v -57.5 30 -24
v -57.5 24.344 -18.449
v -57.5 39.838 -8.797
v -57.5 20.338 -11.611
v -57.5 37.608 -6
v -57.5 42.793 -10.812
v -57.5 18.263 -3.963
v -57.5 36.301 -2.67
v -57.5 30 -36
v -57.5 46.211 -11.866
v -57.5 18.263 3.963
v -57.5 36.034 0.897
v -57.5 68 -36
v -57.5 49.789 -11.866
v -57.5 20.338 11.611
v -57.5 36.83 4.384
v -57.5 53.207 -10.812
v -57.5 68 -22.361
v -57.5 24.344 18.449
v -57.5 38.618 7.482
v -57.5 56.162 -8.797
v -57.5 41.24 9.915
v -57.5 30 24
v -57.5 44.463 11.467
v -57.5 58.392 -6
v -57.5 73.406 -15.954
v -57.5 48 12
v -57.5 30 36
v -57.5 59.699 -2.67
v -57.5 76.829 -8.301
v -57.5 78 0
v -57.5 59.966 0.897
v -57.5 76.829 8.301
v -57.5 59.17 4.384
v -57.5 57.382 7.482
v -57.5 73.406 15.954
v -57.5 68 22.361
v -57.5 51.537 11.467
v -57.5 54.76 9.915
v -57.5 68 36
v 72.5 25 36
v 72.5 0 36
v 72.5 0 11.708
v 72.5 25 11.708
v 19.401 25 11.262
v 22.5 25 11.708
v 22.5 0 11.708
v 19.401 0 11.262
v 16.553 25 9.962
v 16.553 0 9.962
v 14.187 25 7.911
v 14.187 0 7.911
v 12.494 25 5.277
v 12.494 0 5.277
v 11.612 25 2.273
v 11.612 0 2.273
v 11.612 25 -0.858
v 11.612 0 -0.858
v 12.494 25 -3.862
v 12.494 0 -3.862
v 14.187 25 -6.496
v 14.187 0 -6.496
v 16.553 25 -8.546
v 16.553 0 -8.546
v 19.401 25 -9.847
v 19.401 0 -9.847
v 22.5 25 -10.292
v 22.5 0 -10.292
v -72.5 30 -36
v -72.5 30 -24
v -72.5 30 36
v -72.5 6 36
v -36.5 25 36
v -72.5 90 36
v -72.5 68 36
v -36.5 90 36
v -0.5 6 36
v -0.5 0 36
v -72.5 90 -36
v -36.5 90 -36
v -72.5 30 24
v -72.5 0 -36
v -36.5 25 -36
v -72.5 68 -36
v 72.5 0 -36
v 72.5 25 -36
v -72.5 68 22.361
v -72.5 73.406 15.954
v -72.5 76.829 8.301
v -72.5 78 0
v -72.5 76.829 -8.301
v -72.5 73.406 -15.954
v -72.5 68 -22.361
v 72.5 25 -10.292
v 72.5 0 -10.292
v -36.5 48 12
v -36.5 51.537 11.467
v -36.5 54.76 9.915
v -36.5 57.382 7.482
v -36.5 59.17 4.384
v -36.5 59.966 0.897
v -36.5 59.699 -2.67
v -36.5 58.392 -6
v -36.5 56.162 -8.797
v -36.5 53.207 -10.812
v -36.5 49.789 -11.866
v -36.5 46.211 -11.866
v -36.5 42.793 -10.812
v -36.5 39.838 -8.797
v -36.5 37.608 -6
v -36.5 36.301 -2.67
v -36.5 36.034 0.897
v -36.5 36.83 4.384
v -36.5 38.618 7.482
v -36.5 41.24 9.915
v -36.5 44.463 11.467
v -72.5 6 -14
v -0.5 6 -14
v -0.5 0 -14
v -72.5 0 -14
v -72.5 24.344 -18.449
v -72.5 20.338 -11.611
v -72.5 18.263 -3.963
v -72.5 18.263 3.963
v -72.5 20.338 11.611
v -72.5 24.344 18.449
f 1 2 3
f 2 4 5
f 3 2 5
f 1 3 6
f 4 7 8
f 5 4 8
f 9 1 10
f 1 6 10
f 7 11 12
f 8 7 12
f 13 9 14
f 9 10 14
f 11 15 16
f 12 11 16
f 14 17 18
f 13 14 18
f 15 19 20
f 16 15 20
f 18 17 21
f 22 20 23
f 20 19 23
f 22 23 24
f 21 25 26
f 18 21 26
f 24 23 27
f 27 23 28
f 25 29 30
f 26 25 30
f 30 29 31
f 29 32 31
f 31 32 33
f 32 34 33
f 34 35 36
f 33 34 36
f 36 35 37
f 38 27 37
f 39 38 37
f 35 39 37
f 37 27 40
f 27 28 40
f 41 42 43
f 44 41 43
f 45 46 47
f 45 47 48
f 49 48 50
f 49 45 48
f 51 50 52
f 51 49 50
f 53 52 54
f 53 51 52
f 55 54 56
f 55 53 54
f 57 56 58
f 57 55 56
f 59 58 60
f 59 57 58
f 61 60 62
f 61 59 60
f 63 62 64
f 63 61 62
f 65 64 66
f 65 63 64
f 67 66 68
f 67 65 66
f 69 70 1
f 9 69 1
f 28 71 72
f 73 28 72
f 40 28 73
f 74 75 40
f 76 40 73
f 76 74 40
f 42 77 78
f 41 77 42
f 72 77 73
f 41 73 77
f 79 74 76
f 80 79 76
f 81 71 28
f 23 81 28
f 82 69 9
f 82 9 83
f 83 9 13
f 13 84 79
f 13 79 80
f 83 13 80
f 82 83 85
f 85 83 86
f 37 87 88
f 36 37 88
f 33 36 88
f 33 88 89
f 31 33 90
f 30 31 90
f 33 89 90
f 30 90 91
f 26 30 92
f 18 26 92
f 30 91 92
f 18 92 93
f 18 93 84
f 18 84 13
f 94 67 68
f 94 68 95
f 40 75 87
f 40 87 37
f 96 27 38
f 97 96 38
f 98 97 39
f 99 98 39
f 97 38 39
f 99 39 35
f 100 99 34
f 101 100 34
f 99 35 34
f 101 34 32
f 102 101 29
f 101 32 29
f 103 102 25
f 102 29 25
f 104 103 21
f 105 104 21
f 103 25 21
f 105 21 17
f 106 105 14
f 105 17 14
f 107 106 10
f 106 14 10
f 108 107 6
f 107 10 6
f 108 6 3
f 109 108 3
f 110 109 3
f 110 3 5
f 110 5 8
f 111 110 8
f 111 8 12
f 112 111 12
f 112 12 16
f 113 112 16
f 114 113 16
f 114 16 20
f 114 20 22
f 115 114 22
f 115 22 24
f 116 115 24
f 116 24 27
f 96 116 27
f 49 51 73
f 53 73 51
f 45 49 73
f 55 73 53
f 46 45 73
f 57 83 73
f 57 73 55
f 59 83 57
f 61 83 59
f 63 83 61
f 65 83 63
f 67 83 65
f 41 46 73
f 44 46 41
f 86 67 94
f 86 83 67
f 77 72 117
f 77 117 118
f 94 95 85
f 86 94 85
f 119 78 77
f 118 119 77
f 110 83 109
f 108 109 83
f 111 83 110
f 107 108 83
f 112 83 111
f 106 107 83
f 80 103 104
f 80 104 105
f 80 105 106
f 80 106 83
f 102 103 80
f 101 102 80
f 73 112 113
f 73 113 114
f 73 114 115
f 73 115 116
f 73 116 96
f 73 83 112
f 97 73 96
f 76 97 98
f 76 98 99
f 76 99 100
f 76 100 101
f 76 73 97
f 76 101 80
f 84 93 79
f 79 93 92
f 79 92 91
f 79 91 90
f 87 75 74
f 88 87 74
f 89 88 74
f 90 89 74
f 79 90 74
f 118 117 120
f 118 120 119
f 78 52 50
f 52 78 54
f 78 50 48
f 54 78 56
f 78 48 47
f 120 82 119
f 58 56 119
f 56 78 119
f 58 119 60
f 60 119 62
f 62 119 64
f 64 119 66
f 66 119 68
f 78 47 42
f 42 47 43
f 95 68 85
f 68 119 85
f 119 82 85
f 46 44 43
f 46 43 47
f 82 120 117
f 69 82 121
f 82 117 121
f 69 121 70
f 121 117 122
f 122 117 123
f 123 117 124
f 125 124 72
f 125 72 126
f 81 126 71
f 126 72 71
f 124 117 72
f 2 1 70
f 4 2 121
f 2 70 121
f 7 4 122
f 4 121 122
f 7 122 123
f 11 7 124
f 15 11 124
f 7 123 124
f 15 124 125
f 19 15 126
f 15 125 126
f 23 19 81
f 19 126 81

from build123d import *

# Parameters (mm, degrees)
SKETCH1_W           = 145
SKETCH1_H           = 72
BOSS_EXTRUDE1_DEPTH = 25
SKETCH2_W           = 72
SKETCH2_H           = 6
CUT_EXTRUDE1_DEPTH  = 50
CUT_EXTRUDE2_DEPTH  = 50
SKETCH4_W           = 36
SKETCH4_H           = 65
BOSS_EXTRUDE2_DEPTH = 72
SKETCH5_R           = 30
CUT_EXTRUDE3_DEPTH  = 15
SKETCH6_W           = 15
SKETCH6_H           = 38
CUT_EXTRUDE4_DEPTH  = 137.162586638
SKETCH7_R           = 12
CUT_EXTRUDE5_DEPTH  = 163.160414405


with BuildPart() as part:
    # Sketch1 → Boss-Extrude1 (new body)
    with BuildSketch(Plane(origin=(0, 0, 0), x_dir=(1, 0, 0), z_dir=(0, 1, 0))):
        Rectangle(SKETCH1_W, SKETCH1_H)
    extrude(amount=BOSS_EXTRUDE1_DEPTH)

    # Sketch2 → Cut-Extrude1 (cut)
    with BuildSketch(Plane.XY.offset(36)):
        with Locations((-36.5, 3)):
            Rectangle(SKETCH2_W, SKETCH2_H)
    extrude(amount=-CUT_EXTRUDE1_DEPTH, mode=Mode.SUBTRACT)

    # Sketch3 → Cut-Extrude2 (cut)
    with BuildSketch(Plane(origin=(0, 25, 0), x_dir=(1, 0, 0), z_dir=(0, 1, 0))):
        with BuildLine():
            Line((22.5, 10.292135336), (72.5, 10.292135336))
            Line((72.5, 10.292135336), (72.5, -11.707864664))
            Line((72.5, -11.707864664), (22.5, -11.707864664))
            ThreePointArc((22.5, -11.707864664), (11.5, -0.707864664), (22.5, 10.292135336))
        make_face()
    extrude(amount=-CUT_EXTRUDE2_DEPTH, mode=Mode.SUBTRACT)

    # Sketch4 → Boss-Extrude2 (add)
    with BuildSketch(Plane.XY.offset(36)):
        with Locations((-54.5, 57.5)):
            Rectangle(SKETCH4_W, SKETCH4_H)
    extrude(amount=-BOSS_EXTRUDE2_DEPTH)

    # Sketch5 → Cut-Extrude3 (cut)
    with BuildSketch(Plane.ZY.offset(72.5)):
        with Locations((0, 48)):
            Circle(SKETCH5_R)
    extrude(amount=-CUT_EXTRUDE3_DEPTH, mode=Mode.SUBTRACT)

    # Sketch6 → Cut-Extrude4 (cut, through all)
    with BuildSketch(Plane.XY.offset(36)):
        with Locations((-65, 49)):
            Rectangle(SKETCH6_W, SKETCH6_H)
    extrude(amount=-CUT_EXTRUDE4_DEPTH, mode=Mode.SUBTRACT)

    # Sketch7 → Cut-Extrude5 (cut, through all)
    with BuildSketch(Plane.ZY.offset(57.5)):
        with Locations((0, 48)):
            Circle(SKETCH7_R)
    extrude(amount=-CUT_EXTRUDE5_DEPTH, mode=Mode.SUBTRACT)


solid = part.part
